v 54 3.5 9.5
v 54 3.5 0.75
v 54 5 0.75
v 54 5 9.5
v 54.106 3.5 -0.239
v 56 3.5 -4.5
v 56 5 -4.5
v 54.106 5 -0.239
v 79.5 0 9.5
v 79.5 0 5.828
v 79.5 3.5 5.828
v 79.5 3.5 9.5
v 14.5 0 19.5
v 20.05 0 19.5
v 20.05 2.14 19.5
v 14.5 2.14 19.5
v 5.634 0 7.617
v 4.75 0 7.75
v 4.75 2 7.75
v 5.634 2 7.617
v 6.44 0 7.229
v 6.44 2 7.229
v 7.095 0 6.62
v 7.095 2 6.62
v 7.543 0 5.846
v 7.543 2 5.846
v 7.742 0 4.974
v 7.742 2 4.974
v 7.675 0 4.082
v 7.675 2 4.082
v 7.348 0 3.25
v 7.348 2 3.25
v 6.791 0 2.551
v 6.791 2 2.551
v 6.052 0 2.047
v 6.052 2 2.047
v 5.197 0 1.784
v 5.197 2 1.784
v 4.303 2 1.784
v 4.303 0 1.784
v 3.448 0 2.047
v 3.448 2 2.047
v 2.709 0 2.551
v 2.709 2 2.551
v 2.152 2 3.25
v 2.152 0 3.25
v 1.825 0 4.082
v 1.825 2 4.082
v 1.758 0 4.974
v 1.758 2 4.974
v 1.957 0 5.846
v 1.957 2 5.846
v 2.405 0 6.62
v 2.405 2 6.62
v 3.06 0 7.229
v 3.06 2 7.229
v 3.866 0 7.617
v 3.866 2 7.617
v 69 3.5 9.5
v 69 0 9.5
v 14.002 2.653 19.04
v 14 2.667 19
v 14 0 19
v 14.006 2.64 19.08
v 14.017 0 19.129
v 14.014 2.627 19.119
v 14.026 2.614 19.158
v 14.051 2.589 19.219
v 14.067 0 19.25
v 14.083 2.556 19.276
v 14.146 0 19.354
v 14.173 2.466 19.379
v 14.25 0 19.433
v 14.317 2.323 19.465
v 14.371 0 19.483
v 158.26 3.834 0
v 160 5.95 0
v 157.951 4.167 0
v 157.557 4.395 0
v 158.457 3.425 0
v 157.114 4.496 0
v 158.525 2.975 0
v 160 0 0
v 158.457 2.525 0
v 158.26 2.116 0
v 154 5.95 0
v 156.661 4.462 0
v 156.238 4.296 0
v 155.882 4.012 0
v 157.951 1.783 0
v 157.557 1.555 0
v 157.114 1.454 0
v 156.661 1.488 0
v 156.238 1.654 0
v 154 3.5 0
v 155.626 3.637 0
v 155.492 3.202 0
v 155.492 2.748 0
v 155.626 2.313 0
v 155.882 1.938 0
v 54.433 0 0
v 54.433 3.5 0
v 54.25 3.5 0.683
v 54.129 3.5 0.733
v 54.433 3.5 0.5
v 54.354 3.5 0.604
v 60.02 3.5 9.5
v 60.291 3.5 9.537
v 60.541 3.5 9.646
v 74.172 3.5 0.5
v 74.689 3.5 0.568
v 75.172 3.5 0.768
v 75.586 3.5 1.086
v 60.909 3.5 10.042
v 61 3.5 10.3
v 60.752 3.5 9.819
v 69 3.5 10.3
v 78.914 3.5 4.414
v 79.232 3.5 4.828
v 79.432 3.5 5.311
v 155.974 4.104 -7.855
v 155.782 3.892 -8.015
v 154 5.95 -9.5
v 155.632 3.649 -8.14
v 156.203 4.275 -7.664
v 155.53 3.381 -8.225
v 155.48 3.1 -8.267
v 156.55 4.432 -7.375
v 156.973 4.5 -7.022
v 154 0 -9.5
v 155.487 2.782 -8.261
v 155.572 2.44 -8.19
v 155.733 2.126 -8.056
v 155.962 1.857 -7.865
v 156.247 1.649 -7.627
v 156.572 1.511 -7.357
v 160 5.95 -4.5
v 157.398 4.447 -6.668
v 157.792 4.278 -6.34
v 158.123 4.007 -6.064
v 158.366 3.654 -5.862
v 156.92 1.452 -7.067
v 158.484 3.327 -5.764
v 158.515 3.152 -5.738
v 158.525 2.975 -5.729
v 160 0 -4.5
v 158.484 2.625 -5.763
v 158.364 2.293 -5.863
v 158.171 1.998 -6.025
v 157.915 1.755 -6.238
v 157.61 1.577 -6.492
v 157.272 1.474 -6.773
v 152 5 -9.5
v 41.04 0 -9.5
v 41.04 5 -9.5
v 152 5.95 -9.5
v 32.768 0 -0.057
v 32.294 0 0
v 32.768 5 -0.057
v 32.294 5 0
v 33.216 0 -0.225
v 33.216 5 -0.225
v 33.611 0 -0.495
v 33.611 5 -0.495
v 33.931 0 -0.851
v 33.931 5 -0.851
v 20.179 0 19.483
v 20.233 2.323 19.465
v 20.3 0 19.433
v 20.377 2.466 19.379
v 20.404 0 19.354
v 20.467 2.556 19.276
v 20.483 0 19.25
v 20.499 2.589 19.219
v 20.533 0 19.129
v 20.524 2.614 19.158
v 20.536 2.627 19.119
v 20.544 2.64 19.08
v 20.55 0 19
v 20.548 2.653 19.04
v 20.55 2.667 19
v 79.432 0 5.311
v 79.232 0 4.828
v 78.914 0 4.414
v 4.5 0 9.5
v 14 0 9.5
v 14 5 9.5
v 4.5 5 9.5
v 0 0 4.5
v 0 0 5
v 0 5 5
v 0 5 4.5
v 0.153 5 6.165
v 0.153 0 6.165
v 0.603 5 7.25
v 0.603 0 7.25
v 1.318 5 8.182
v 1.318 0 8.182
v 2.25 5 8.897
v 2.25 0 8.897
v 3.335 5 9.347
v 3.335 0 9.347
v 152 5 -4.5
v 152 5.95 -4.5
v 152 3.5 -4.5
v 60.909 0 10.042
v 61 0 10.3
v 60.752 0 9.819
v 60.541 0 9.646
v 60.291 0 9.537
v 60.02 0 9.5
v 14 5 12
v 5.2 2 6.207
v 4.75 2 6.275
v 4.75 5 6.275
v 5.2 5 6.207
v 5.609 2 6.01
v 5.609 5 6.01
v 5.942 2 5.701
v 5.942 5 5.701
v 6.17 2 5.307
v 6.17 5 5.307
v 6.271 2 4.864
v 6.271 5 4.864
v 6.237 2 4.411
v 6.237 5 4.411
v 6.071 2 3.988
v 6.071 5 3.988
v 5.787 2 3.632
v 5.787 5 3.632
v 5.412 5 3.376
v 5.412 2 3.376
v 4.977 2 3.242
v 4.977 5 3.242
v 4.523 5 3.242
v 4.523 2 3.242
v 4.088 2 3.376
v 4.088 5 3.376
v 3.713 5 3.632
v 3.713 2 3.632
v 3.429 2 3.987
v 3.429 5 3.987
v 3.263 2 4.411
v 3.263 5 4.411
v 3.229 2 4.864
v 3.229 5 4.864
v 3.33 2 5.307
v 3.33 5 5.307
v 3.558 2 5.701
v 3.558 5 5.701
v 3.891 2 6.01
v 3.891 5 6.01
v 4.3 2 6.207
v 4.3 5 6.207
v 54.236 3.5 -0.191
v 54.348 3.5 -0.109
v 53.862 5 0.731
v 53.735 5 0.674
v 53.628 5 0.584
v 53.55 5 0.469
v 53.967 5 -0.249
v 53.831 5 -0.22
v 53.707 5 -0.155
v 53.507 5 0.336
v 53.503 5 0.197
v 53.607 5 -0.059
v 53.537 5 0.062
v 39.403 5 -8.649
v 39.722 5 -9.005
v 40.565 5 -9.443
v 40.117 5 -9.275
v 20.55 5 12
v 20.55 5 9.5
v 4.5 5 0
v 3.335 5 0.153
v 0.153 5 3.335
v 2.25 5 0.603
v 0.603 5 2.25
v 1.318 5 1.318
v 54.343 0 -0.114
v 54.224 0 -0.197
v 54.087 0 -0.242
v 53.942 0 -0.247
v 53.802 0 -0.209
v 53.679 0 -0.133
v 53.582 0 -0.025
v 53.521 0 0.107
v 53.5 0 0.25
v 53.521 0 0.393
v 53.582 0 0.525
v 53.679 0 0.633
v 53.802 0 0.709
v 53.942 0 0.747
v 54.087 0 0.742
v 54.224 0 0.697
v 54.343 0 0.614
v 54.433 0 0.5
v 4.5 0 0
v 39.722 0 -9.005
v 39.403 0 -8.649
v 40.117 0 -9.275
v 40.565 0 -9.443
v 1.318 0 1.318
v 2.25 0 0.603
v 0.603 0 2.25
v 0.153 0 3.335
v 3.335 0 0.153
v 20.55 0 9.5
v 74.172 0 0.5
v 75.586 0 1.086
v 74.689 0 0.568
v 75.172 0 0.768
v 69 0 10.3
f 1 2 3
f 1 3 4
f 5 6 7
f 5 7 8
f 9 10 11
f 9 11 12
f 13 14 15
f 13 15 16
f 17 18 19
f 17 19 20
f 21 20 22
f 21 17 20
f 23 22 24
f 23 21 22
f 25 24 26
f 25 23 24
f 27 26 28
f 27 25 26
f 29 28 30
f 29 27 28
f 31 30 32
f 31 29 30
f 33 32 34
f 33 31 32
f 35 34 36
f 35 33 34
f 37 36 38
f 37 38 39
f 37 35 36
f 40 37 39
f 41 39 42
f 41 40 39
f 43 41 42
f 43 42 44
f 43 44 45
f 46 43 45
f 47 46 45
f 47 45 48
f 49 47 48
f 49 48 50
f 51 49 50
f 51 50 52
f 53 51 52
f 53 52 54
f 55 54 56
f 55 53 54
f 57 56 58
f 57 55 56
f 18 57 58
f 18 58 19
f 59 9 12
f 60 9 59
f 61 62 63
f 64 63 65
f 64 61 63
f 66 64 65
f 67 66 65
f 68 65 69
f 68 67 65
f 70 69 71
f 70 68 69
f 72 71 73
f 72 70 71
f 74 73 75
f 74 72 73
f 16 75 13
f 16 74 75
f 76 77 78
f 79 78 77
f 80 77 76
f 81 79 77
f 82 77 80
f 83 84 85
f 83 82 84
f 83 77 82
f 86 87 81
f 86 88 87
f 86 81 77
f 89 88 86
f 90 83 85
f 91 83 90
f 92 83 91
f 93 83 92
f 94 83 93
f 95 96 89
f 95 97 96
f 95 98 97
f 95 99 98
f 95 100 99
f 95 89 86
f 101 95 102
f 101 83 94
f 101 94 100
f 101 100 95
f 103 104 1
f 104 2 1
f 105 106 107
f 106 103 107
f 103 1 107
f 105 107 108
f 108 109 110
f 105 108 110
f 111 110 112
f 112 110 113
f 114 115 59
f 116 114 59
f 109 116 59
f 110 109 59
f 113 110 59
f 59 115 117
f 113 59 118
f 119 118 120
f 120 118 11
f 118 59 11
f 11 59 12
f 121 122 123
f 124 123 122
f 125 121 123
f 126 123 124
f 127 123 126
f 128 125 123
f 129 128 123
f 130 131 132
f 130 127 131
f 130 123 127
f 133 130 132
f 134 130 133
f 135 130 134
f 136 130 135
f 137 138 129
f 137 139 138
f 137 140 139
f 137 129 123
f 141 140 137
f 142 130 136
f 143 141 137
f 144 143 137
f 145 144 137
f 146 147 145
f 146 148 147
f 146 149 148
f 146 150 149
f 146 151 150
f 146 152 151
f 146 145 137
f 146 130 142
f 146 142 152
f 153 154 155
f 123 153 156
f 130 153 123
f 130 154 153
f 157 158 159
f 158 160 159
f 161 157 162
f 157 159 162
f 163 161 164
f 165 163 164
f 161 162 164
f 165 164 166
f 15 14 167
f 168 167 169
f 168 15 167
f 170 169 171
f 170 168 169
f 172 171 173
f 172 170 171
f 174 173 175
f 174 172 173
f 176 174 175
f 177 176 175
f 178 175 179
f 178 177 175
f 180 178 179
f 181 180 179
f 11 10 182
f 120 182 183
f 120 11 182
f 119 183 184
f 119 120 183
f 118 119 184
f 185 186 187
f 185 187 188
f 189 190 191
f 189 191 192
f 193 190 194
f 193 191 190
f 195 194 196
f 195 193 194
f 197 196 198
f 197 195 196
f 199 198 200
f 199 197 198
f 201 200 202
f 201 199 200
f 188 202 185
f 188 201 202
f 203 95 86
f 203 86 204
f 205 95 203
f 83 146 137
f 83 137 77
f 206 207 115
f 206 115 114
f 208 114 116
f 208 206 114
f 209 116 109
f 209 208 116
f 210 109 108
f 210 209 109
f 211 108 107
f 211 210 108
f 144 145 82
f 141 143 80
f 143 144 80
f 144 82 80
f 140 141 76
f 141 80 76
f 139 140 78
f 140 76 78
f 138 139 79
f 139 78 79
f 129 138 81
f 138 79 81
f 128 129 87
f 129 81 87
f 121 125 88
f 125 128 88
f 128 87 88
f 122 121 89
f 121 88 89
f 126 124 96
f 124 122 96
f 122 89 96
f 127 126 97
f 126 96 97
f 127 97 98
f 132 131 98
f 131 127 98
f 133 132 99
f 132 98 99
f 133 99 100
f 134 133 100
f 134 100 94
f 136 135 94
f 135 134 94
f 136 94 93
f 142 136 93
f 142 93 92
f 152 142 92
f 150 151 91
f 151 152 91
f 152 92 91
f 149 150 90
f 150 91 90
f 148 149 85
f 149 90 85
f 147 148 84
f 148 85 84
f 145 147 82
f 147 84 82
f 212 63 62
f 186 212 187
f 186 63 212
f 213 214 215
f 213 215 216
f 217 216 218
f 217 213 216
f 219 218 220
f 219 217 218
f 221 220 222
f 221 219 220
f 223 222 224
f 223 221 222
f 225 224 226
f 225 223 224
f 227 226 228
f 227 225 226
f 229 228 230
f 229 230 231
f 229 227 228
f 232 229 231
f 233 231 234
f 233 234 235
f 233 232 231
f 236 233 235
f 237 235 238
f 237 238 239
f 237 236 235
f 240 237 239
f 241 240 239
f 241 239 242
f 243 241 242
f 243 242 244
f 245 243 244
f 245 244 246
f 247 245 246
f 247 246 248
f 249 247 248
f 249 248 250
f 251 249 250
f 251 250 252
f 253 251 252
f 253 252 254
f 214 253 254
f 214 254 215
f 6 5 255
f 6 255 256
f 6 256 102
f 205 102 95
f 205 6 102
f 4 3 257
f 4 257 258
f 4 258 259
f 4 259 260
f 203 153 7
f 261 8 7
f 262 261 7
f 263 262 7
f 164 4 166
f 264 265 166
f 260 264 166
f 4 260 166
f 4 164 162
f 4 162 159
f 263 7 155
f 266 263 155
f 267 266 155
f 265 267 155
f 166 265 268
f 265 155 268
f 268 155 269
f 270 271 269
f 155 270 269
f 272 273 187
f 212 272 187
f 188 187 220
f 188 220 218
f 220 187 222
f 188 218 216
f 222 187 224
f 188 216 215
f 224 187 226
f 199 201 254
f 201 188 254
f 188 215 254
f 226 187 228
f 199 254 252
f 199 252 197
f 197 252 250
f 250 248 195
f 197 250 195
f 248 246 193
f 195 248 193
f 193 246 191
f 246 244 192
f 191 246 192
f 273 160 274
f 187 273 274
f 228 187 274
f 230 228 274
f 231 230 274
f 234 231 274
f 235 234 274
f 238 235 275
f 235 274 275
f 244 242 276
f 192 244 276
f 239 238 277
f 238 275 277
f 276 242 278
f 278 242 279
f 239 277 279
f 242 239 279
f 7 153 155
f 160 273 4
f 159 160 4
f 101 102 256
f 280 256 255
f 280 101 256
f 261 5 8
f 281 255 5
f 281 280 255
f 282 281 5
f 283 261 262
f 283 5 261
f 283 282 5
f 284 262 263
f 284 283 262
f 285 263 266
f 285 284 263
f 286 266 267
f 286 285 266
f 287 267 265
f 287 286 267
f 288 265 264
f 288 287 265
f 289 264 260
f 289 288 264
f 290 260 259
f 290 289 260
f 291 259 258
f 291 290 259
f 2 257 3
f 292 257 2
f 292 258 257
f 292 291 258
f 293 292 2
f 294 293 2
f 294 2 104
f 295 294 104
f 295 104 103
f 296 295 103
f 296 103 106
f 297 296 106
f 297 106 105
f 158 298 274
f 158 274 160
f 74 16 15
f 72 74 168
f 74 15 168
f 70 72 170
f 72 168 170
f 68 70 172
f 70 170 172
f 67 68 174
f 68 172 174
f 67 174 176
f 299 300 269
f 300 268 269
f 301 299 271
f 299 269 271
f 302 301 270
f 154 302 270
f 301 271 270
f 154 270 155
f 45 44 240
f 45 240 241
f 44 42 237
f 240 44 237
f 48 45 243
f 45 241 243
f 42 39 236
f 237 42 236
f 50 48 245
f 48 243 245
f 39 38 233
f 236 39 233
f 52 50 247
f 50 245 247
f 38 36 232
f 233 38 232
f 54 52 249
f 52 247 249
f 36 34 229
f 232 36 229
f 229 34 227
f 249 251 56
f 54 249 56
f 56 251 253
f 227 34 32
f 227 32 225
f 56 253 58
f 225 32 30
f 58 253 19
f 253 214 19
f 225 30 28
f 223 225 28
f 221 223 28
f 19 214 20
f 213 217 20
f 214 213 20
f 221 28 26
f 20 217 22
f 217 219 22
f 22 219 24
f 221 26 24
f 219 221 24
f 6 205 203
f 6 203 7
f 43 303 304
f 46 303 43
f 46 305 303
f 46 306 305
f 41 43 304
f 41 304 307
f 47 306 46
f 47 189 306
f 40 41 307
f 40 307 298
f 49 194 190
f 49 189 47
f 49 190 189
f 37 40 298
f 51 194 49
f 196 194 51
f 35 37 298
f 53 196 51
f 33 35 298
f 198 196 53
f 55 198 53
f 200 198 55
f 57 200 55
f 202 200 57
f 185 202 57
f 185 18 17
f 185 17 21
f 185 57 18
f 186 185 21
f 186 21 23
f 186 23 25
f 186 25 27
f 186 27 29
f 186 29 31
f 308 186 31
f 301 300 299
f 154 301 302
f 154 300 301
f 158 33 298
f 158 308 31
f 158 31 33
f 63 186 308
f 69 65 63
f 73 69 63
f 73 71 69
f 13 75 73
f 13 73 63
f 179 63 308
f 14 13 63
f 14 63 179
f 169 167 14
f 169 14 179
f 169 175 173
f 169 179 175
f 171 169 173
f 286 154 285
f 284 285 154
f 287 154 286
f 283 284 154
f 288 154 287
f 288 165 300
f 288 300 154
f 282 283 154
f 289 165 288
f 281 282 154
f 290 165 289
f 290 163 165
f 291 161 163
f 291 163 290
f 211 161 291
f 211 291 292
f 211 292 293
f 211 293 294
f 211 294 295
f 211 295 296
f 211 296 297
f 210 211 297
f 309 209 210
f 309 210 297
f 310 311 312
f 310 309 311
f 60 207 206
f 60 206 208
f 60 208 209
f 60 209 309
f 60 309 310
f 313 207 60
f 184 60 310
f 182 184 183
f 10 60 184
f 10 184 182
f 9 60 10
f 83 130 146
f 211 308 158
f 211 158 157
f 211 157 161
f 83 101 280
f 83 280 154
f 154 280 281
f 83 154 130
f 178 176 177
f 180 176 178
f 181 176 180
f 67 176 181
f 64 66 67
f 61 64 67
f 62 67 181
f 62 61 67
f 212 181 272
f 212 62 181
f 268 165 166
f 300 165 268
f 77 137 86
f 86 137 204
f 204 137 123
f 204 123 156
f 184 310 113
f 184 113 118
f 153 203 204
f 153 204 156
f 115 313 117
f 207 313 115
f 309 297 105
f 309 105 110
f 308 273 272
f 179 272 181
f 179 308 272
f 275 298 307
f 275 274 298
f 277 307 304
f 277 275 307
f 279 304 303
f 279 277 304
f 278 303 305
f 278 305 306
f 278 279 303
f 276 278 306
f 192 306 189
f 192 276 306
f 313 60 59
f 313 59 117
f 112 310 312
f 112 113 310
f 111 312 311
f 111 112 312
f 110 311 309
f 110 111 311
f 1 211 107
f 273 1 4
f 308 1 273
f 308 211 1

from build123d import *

# Parameters (mm, degrees)
SKETCH_1_R          = 1.525
EXTRUDE_2_DEPTH     = 5
CUT_EXTRUDE_START   = 3.5
CUT_EXTRUDE_1_DEPTH = 158.761433703
EXTRUDE_START       = -5
EXTRUDE_4_DEPTH     = 5.95
SKETCH_4_R          = 1.525
CUT_EXTRUDE_2_DEPTH = 162.293684005
SKETCH_5_R          = 3
CUT_EXTRUDE_3_DEPTH = 2
FILLET_1_R          = 4.5
CUT_EXTRUDE_4_DEPTH = 162.293684005
FILLET_4_R          = 0.5
FILLET_5_R          = 2
FILLET_11_R         = 1
CUT_EXTRUDE_5_DEPTH = 10
FILLET_12_R         = 2


with BuildPart() as part:
    # 草图1 → 凸台-拉伸2 (new body)
    with BuildSketch(Plane(origin=(0, 0, 0), x_dir=(1, 0, 0), z_dir=(0, 1, 0))):
        with BuildLine():
            Line((0, 0), (33.333333333, 0))
            Line((33.333333333, 0), (40, 9.5))
            Line((40, 9.5), (44, 9.5))
            Line((44, 9.5), (54, 9.5))
            Line((54, 9.5), (154, 9.5))
            Line((154, 9.5), (160, 4.5))
            Line((160, 4.5), (160, 0))
            Line((160, 0), (54.433012702, 0))
            ThreePointArc((54.433012702, 0), (53.5, -0.25), (54.433012702, -0.5))
            Line((54.433012702, -0.5), (67, -0.5))
            Line((67, -0.5), (70, -0.5))
            Line((70, -0.5), (79.5, -0.5))
            Line((79.5, -0.5), (79.5, -9.5))
            Line((79.5, -9.5), (70, -9.5))
            Line((70, -9.5), (69, -9.5))
            Line((69, -9.5), (69, -10.3))
            Line((69, -10.3), (61, -10.3))
            Line((61, -10.3), (61, -9.5))
            Line((61, -9.5), (20.55, -9.5))
            Line((20.55, -9.5), (20.55, -19.5))
            Line((20.55, -19.5), (14, -19.5))
            Line((14, -19.5), (14, -9.5))
            Line((14, -9.5), (0, -9.5))
            Line((0, -9.5), (0, 0))
        make_face()
        with Locations(Location((4.75, -4.75, 0), (0, 0, 270))):
            Circle(SKETCH_1_R, mode=Mode.SUBTRACT)
    extrude(amount=EXTRUDE_2_DEPTH)

    # 草图2 → 切除-拉伸1 (cut, through all)
    with BuildSketch(Plane(origin=(0, 0, 0), x_dir=(1, 0, 0), z_dir=(0, 1, 0)).offset(CUT_EXTRUDE_START)):
        Polygon((54, -9.5), (54, -0.5), (67, -0.5), (83.595743226, -0.5), (83.595743226, -15.95528926), (54, -15.95528926), align=None)
        Polygon((54, 0), (154, 0), (152, 4.5), (56, 4.5), align=None)
    extrude(amount=CUT_EXTRUDE_1_DEPTH, mode=Mode.SUBTRACT)

    # 草图3 → 凸台-拉伸4 (add)
    with BuildSketch(Plane(origin=(0, 5, 0), x_dir=(1, 0, 0), z_dir=(0, 1, 0)).offset(EXTRUDE_START)):
        Polygon((152, 4.5), (152, 9.5), (154, 9.5), (160, 4.5), (160, 0), (154, 0), align=None)
    extrude(amount=EXTRUDE_4_DEPTH)

    # 草图4 → 切除-拉伸2 (cut, through all)
    with BuildSketch(Plane.XY):
        with Locations((157, 2.975)):
            Circle(SKETCH_4_R)
    extrude(amount=-CUT_EXTRUDE_2_DEPTH, mode=Mode.SUBTRACT)

    # 草图5 → 切除-拉伸3 (cut)
    with BuildSketch(Plane(origin=(0, 0, 0), x_dir=(1, 0, 0), z_dir=(0, 1, 0))):
        with Locations(Location((4.75, -4.75, 0), (0, 0, 270))):
            Circle(SKETCH_5_R)
    extrude(amount=CUT_EXTRUDE_3_DEPTH, mode=Mode.SUBTRACT)

    # 圆角1
    fillet_1_edges = [part.edges().sort_by_distance(p)[0] for p in [
        (0, 2.5, 9.5),
        (0, 2.5, 0),
    ]]
    fillet(fillet_1_edges, radius=FILLET_1_R)

    # 草图7 → 切除-拉伸4 (cut, through all)
    with BuildSketch(Plane(origin=(0, 0, 0), x_dir=(0, 0, -1), z_dir=(1, 0, 0))):
        Polygon((-19.5, 2.5), (-12, 5), (-19.5, 5), align=None)
    extrude(amount=CUT_EXTRUDE_4_DEPTH, mode=Mode.SUBTRACT)

    # 圆角4
    fillet_4_edges = [part.edges().sort_by_distance(p)[0] for p in [
        (20.55, 1.25, 19.5),
        (14, 1.25, 19.5),
        (17.275, 2.5, 19.5),
    ]]
    fillet(fillet_4_edges, radius=FILLET_4_R)

    # 圆角5
    fillet_5_edges = [part.edges().sort_by_distance(p)[0] for p in [
        (33.333333333, 2.5, 0),
        (40, 2.5, -9.5),
    ]]
    fillet(fillet_5_edges, radius=FILLET_5_R)

    # 圆角11
    # the kernel refuses this fillet: 1 mm, written as the material it adds along each edge
    with BuildSketch(Plane(origin=(61, 0, 9.5), x_dir=(-1, 0, 0), z_dir=(0, 1, 0))) as fillet_11_piece_1:
        with BuildLine():
            CenterArc((0.979795897, 1), FILLET_11_R, 191.536959033, 78.463040967)
            Line((0, 0.8), (-0.019595918, 0.796))
            ThreePointArc((-0.019595918, 0.796), (-0.02, 0.4), (-0.02, 0))
            Line((-0.02, 0), (0, -0.02))
            Line((0, -0.02), (0.979795897, -0.02))
            Line((0.979795897, -0.02), (0.979795897, 0))
        make_face()
    extrude(amount=3.5)

    # 草图9 → 切除-拉伸5 (cut)
    with BuildSketch(Plane(origin=(0, 0, 0), x_dir=(1, 0, 0), z_dir=(0, 1, 0))):
        Polygon((75, -0.5), (79.5, -5), (79.5, -0.5), align=None)
    extrude(amount=CUT_EXTRUDE_5_DEPTH, mode=Mode.SUBTRACT)

    # 圆角12
    fillet_12_edges = [part.edges().sort_by_distance(p)[0] for p in [
        (75, 1.75, 0.5),
        (79.5, 1.75, 5),
    ]]
    fillet(fillet_12_edges, radius=FILLET_12_R)


solid = part.part
